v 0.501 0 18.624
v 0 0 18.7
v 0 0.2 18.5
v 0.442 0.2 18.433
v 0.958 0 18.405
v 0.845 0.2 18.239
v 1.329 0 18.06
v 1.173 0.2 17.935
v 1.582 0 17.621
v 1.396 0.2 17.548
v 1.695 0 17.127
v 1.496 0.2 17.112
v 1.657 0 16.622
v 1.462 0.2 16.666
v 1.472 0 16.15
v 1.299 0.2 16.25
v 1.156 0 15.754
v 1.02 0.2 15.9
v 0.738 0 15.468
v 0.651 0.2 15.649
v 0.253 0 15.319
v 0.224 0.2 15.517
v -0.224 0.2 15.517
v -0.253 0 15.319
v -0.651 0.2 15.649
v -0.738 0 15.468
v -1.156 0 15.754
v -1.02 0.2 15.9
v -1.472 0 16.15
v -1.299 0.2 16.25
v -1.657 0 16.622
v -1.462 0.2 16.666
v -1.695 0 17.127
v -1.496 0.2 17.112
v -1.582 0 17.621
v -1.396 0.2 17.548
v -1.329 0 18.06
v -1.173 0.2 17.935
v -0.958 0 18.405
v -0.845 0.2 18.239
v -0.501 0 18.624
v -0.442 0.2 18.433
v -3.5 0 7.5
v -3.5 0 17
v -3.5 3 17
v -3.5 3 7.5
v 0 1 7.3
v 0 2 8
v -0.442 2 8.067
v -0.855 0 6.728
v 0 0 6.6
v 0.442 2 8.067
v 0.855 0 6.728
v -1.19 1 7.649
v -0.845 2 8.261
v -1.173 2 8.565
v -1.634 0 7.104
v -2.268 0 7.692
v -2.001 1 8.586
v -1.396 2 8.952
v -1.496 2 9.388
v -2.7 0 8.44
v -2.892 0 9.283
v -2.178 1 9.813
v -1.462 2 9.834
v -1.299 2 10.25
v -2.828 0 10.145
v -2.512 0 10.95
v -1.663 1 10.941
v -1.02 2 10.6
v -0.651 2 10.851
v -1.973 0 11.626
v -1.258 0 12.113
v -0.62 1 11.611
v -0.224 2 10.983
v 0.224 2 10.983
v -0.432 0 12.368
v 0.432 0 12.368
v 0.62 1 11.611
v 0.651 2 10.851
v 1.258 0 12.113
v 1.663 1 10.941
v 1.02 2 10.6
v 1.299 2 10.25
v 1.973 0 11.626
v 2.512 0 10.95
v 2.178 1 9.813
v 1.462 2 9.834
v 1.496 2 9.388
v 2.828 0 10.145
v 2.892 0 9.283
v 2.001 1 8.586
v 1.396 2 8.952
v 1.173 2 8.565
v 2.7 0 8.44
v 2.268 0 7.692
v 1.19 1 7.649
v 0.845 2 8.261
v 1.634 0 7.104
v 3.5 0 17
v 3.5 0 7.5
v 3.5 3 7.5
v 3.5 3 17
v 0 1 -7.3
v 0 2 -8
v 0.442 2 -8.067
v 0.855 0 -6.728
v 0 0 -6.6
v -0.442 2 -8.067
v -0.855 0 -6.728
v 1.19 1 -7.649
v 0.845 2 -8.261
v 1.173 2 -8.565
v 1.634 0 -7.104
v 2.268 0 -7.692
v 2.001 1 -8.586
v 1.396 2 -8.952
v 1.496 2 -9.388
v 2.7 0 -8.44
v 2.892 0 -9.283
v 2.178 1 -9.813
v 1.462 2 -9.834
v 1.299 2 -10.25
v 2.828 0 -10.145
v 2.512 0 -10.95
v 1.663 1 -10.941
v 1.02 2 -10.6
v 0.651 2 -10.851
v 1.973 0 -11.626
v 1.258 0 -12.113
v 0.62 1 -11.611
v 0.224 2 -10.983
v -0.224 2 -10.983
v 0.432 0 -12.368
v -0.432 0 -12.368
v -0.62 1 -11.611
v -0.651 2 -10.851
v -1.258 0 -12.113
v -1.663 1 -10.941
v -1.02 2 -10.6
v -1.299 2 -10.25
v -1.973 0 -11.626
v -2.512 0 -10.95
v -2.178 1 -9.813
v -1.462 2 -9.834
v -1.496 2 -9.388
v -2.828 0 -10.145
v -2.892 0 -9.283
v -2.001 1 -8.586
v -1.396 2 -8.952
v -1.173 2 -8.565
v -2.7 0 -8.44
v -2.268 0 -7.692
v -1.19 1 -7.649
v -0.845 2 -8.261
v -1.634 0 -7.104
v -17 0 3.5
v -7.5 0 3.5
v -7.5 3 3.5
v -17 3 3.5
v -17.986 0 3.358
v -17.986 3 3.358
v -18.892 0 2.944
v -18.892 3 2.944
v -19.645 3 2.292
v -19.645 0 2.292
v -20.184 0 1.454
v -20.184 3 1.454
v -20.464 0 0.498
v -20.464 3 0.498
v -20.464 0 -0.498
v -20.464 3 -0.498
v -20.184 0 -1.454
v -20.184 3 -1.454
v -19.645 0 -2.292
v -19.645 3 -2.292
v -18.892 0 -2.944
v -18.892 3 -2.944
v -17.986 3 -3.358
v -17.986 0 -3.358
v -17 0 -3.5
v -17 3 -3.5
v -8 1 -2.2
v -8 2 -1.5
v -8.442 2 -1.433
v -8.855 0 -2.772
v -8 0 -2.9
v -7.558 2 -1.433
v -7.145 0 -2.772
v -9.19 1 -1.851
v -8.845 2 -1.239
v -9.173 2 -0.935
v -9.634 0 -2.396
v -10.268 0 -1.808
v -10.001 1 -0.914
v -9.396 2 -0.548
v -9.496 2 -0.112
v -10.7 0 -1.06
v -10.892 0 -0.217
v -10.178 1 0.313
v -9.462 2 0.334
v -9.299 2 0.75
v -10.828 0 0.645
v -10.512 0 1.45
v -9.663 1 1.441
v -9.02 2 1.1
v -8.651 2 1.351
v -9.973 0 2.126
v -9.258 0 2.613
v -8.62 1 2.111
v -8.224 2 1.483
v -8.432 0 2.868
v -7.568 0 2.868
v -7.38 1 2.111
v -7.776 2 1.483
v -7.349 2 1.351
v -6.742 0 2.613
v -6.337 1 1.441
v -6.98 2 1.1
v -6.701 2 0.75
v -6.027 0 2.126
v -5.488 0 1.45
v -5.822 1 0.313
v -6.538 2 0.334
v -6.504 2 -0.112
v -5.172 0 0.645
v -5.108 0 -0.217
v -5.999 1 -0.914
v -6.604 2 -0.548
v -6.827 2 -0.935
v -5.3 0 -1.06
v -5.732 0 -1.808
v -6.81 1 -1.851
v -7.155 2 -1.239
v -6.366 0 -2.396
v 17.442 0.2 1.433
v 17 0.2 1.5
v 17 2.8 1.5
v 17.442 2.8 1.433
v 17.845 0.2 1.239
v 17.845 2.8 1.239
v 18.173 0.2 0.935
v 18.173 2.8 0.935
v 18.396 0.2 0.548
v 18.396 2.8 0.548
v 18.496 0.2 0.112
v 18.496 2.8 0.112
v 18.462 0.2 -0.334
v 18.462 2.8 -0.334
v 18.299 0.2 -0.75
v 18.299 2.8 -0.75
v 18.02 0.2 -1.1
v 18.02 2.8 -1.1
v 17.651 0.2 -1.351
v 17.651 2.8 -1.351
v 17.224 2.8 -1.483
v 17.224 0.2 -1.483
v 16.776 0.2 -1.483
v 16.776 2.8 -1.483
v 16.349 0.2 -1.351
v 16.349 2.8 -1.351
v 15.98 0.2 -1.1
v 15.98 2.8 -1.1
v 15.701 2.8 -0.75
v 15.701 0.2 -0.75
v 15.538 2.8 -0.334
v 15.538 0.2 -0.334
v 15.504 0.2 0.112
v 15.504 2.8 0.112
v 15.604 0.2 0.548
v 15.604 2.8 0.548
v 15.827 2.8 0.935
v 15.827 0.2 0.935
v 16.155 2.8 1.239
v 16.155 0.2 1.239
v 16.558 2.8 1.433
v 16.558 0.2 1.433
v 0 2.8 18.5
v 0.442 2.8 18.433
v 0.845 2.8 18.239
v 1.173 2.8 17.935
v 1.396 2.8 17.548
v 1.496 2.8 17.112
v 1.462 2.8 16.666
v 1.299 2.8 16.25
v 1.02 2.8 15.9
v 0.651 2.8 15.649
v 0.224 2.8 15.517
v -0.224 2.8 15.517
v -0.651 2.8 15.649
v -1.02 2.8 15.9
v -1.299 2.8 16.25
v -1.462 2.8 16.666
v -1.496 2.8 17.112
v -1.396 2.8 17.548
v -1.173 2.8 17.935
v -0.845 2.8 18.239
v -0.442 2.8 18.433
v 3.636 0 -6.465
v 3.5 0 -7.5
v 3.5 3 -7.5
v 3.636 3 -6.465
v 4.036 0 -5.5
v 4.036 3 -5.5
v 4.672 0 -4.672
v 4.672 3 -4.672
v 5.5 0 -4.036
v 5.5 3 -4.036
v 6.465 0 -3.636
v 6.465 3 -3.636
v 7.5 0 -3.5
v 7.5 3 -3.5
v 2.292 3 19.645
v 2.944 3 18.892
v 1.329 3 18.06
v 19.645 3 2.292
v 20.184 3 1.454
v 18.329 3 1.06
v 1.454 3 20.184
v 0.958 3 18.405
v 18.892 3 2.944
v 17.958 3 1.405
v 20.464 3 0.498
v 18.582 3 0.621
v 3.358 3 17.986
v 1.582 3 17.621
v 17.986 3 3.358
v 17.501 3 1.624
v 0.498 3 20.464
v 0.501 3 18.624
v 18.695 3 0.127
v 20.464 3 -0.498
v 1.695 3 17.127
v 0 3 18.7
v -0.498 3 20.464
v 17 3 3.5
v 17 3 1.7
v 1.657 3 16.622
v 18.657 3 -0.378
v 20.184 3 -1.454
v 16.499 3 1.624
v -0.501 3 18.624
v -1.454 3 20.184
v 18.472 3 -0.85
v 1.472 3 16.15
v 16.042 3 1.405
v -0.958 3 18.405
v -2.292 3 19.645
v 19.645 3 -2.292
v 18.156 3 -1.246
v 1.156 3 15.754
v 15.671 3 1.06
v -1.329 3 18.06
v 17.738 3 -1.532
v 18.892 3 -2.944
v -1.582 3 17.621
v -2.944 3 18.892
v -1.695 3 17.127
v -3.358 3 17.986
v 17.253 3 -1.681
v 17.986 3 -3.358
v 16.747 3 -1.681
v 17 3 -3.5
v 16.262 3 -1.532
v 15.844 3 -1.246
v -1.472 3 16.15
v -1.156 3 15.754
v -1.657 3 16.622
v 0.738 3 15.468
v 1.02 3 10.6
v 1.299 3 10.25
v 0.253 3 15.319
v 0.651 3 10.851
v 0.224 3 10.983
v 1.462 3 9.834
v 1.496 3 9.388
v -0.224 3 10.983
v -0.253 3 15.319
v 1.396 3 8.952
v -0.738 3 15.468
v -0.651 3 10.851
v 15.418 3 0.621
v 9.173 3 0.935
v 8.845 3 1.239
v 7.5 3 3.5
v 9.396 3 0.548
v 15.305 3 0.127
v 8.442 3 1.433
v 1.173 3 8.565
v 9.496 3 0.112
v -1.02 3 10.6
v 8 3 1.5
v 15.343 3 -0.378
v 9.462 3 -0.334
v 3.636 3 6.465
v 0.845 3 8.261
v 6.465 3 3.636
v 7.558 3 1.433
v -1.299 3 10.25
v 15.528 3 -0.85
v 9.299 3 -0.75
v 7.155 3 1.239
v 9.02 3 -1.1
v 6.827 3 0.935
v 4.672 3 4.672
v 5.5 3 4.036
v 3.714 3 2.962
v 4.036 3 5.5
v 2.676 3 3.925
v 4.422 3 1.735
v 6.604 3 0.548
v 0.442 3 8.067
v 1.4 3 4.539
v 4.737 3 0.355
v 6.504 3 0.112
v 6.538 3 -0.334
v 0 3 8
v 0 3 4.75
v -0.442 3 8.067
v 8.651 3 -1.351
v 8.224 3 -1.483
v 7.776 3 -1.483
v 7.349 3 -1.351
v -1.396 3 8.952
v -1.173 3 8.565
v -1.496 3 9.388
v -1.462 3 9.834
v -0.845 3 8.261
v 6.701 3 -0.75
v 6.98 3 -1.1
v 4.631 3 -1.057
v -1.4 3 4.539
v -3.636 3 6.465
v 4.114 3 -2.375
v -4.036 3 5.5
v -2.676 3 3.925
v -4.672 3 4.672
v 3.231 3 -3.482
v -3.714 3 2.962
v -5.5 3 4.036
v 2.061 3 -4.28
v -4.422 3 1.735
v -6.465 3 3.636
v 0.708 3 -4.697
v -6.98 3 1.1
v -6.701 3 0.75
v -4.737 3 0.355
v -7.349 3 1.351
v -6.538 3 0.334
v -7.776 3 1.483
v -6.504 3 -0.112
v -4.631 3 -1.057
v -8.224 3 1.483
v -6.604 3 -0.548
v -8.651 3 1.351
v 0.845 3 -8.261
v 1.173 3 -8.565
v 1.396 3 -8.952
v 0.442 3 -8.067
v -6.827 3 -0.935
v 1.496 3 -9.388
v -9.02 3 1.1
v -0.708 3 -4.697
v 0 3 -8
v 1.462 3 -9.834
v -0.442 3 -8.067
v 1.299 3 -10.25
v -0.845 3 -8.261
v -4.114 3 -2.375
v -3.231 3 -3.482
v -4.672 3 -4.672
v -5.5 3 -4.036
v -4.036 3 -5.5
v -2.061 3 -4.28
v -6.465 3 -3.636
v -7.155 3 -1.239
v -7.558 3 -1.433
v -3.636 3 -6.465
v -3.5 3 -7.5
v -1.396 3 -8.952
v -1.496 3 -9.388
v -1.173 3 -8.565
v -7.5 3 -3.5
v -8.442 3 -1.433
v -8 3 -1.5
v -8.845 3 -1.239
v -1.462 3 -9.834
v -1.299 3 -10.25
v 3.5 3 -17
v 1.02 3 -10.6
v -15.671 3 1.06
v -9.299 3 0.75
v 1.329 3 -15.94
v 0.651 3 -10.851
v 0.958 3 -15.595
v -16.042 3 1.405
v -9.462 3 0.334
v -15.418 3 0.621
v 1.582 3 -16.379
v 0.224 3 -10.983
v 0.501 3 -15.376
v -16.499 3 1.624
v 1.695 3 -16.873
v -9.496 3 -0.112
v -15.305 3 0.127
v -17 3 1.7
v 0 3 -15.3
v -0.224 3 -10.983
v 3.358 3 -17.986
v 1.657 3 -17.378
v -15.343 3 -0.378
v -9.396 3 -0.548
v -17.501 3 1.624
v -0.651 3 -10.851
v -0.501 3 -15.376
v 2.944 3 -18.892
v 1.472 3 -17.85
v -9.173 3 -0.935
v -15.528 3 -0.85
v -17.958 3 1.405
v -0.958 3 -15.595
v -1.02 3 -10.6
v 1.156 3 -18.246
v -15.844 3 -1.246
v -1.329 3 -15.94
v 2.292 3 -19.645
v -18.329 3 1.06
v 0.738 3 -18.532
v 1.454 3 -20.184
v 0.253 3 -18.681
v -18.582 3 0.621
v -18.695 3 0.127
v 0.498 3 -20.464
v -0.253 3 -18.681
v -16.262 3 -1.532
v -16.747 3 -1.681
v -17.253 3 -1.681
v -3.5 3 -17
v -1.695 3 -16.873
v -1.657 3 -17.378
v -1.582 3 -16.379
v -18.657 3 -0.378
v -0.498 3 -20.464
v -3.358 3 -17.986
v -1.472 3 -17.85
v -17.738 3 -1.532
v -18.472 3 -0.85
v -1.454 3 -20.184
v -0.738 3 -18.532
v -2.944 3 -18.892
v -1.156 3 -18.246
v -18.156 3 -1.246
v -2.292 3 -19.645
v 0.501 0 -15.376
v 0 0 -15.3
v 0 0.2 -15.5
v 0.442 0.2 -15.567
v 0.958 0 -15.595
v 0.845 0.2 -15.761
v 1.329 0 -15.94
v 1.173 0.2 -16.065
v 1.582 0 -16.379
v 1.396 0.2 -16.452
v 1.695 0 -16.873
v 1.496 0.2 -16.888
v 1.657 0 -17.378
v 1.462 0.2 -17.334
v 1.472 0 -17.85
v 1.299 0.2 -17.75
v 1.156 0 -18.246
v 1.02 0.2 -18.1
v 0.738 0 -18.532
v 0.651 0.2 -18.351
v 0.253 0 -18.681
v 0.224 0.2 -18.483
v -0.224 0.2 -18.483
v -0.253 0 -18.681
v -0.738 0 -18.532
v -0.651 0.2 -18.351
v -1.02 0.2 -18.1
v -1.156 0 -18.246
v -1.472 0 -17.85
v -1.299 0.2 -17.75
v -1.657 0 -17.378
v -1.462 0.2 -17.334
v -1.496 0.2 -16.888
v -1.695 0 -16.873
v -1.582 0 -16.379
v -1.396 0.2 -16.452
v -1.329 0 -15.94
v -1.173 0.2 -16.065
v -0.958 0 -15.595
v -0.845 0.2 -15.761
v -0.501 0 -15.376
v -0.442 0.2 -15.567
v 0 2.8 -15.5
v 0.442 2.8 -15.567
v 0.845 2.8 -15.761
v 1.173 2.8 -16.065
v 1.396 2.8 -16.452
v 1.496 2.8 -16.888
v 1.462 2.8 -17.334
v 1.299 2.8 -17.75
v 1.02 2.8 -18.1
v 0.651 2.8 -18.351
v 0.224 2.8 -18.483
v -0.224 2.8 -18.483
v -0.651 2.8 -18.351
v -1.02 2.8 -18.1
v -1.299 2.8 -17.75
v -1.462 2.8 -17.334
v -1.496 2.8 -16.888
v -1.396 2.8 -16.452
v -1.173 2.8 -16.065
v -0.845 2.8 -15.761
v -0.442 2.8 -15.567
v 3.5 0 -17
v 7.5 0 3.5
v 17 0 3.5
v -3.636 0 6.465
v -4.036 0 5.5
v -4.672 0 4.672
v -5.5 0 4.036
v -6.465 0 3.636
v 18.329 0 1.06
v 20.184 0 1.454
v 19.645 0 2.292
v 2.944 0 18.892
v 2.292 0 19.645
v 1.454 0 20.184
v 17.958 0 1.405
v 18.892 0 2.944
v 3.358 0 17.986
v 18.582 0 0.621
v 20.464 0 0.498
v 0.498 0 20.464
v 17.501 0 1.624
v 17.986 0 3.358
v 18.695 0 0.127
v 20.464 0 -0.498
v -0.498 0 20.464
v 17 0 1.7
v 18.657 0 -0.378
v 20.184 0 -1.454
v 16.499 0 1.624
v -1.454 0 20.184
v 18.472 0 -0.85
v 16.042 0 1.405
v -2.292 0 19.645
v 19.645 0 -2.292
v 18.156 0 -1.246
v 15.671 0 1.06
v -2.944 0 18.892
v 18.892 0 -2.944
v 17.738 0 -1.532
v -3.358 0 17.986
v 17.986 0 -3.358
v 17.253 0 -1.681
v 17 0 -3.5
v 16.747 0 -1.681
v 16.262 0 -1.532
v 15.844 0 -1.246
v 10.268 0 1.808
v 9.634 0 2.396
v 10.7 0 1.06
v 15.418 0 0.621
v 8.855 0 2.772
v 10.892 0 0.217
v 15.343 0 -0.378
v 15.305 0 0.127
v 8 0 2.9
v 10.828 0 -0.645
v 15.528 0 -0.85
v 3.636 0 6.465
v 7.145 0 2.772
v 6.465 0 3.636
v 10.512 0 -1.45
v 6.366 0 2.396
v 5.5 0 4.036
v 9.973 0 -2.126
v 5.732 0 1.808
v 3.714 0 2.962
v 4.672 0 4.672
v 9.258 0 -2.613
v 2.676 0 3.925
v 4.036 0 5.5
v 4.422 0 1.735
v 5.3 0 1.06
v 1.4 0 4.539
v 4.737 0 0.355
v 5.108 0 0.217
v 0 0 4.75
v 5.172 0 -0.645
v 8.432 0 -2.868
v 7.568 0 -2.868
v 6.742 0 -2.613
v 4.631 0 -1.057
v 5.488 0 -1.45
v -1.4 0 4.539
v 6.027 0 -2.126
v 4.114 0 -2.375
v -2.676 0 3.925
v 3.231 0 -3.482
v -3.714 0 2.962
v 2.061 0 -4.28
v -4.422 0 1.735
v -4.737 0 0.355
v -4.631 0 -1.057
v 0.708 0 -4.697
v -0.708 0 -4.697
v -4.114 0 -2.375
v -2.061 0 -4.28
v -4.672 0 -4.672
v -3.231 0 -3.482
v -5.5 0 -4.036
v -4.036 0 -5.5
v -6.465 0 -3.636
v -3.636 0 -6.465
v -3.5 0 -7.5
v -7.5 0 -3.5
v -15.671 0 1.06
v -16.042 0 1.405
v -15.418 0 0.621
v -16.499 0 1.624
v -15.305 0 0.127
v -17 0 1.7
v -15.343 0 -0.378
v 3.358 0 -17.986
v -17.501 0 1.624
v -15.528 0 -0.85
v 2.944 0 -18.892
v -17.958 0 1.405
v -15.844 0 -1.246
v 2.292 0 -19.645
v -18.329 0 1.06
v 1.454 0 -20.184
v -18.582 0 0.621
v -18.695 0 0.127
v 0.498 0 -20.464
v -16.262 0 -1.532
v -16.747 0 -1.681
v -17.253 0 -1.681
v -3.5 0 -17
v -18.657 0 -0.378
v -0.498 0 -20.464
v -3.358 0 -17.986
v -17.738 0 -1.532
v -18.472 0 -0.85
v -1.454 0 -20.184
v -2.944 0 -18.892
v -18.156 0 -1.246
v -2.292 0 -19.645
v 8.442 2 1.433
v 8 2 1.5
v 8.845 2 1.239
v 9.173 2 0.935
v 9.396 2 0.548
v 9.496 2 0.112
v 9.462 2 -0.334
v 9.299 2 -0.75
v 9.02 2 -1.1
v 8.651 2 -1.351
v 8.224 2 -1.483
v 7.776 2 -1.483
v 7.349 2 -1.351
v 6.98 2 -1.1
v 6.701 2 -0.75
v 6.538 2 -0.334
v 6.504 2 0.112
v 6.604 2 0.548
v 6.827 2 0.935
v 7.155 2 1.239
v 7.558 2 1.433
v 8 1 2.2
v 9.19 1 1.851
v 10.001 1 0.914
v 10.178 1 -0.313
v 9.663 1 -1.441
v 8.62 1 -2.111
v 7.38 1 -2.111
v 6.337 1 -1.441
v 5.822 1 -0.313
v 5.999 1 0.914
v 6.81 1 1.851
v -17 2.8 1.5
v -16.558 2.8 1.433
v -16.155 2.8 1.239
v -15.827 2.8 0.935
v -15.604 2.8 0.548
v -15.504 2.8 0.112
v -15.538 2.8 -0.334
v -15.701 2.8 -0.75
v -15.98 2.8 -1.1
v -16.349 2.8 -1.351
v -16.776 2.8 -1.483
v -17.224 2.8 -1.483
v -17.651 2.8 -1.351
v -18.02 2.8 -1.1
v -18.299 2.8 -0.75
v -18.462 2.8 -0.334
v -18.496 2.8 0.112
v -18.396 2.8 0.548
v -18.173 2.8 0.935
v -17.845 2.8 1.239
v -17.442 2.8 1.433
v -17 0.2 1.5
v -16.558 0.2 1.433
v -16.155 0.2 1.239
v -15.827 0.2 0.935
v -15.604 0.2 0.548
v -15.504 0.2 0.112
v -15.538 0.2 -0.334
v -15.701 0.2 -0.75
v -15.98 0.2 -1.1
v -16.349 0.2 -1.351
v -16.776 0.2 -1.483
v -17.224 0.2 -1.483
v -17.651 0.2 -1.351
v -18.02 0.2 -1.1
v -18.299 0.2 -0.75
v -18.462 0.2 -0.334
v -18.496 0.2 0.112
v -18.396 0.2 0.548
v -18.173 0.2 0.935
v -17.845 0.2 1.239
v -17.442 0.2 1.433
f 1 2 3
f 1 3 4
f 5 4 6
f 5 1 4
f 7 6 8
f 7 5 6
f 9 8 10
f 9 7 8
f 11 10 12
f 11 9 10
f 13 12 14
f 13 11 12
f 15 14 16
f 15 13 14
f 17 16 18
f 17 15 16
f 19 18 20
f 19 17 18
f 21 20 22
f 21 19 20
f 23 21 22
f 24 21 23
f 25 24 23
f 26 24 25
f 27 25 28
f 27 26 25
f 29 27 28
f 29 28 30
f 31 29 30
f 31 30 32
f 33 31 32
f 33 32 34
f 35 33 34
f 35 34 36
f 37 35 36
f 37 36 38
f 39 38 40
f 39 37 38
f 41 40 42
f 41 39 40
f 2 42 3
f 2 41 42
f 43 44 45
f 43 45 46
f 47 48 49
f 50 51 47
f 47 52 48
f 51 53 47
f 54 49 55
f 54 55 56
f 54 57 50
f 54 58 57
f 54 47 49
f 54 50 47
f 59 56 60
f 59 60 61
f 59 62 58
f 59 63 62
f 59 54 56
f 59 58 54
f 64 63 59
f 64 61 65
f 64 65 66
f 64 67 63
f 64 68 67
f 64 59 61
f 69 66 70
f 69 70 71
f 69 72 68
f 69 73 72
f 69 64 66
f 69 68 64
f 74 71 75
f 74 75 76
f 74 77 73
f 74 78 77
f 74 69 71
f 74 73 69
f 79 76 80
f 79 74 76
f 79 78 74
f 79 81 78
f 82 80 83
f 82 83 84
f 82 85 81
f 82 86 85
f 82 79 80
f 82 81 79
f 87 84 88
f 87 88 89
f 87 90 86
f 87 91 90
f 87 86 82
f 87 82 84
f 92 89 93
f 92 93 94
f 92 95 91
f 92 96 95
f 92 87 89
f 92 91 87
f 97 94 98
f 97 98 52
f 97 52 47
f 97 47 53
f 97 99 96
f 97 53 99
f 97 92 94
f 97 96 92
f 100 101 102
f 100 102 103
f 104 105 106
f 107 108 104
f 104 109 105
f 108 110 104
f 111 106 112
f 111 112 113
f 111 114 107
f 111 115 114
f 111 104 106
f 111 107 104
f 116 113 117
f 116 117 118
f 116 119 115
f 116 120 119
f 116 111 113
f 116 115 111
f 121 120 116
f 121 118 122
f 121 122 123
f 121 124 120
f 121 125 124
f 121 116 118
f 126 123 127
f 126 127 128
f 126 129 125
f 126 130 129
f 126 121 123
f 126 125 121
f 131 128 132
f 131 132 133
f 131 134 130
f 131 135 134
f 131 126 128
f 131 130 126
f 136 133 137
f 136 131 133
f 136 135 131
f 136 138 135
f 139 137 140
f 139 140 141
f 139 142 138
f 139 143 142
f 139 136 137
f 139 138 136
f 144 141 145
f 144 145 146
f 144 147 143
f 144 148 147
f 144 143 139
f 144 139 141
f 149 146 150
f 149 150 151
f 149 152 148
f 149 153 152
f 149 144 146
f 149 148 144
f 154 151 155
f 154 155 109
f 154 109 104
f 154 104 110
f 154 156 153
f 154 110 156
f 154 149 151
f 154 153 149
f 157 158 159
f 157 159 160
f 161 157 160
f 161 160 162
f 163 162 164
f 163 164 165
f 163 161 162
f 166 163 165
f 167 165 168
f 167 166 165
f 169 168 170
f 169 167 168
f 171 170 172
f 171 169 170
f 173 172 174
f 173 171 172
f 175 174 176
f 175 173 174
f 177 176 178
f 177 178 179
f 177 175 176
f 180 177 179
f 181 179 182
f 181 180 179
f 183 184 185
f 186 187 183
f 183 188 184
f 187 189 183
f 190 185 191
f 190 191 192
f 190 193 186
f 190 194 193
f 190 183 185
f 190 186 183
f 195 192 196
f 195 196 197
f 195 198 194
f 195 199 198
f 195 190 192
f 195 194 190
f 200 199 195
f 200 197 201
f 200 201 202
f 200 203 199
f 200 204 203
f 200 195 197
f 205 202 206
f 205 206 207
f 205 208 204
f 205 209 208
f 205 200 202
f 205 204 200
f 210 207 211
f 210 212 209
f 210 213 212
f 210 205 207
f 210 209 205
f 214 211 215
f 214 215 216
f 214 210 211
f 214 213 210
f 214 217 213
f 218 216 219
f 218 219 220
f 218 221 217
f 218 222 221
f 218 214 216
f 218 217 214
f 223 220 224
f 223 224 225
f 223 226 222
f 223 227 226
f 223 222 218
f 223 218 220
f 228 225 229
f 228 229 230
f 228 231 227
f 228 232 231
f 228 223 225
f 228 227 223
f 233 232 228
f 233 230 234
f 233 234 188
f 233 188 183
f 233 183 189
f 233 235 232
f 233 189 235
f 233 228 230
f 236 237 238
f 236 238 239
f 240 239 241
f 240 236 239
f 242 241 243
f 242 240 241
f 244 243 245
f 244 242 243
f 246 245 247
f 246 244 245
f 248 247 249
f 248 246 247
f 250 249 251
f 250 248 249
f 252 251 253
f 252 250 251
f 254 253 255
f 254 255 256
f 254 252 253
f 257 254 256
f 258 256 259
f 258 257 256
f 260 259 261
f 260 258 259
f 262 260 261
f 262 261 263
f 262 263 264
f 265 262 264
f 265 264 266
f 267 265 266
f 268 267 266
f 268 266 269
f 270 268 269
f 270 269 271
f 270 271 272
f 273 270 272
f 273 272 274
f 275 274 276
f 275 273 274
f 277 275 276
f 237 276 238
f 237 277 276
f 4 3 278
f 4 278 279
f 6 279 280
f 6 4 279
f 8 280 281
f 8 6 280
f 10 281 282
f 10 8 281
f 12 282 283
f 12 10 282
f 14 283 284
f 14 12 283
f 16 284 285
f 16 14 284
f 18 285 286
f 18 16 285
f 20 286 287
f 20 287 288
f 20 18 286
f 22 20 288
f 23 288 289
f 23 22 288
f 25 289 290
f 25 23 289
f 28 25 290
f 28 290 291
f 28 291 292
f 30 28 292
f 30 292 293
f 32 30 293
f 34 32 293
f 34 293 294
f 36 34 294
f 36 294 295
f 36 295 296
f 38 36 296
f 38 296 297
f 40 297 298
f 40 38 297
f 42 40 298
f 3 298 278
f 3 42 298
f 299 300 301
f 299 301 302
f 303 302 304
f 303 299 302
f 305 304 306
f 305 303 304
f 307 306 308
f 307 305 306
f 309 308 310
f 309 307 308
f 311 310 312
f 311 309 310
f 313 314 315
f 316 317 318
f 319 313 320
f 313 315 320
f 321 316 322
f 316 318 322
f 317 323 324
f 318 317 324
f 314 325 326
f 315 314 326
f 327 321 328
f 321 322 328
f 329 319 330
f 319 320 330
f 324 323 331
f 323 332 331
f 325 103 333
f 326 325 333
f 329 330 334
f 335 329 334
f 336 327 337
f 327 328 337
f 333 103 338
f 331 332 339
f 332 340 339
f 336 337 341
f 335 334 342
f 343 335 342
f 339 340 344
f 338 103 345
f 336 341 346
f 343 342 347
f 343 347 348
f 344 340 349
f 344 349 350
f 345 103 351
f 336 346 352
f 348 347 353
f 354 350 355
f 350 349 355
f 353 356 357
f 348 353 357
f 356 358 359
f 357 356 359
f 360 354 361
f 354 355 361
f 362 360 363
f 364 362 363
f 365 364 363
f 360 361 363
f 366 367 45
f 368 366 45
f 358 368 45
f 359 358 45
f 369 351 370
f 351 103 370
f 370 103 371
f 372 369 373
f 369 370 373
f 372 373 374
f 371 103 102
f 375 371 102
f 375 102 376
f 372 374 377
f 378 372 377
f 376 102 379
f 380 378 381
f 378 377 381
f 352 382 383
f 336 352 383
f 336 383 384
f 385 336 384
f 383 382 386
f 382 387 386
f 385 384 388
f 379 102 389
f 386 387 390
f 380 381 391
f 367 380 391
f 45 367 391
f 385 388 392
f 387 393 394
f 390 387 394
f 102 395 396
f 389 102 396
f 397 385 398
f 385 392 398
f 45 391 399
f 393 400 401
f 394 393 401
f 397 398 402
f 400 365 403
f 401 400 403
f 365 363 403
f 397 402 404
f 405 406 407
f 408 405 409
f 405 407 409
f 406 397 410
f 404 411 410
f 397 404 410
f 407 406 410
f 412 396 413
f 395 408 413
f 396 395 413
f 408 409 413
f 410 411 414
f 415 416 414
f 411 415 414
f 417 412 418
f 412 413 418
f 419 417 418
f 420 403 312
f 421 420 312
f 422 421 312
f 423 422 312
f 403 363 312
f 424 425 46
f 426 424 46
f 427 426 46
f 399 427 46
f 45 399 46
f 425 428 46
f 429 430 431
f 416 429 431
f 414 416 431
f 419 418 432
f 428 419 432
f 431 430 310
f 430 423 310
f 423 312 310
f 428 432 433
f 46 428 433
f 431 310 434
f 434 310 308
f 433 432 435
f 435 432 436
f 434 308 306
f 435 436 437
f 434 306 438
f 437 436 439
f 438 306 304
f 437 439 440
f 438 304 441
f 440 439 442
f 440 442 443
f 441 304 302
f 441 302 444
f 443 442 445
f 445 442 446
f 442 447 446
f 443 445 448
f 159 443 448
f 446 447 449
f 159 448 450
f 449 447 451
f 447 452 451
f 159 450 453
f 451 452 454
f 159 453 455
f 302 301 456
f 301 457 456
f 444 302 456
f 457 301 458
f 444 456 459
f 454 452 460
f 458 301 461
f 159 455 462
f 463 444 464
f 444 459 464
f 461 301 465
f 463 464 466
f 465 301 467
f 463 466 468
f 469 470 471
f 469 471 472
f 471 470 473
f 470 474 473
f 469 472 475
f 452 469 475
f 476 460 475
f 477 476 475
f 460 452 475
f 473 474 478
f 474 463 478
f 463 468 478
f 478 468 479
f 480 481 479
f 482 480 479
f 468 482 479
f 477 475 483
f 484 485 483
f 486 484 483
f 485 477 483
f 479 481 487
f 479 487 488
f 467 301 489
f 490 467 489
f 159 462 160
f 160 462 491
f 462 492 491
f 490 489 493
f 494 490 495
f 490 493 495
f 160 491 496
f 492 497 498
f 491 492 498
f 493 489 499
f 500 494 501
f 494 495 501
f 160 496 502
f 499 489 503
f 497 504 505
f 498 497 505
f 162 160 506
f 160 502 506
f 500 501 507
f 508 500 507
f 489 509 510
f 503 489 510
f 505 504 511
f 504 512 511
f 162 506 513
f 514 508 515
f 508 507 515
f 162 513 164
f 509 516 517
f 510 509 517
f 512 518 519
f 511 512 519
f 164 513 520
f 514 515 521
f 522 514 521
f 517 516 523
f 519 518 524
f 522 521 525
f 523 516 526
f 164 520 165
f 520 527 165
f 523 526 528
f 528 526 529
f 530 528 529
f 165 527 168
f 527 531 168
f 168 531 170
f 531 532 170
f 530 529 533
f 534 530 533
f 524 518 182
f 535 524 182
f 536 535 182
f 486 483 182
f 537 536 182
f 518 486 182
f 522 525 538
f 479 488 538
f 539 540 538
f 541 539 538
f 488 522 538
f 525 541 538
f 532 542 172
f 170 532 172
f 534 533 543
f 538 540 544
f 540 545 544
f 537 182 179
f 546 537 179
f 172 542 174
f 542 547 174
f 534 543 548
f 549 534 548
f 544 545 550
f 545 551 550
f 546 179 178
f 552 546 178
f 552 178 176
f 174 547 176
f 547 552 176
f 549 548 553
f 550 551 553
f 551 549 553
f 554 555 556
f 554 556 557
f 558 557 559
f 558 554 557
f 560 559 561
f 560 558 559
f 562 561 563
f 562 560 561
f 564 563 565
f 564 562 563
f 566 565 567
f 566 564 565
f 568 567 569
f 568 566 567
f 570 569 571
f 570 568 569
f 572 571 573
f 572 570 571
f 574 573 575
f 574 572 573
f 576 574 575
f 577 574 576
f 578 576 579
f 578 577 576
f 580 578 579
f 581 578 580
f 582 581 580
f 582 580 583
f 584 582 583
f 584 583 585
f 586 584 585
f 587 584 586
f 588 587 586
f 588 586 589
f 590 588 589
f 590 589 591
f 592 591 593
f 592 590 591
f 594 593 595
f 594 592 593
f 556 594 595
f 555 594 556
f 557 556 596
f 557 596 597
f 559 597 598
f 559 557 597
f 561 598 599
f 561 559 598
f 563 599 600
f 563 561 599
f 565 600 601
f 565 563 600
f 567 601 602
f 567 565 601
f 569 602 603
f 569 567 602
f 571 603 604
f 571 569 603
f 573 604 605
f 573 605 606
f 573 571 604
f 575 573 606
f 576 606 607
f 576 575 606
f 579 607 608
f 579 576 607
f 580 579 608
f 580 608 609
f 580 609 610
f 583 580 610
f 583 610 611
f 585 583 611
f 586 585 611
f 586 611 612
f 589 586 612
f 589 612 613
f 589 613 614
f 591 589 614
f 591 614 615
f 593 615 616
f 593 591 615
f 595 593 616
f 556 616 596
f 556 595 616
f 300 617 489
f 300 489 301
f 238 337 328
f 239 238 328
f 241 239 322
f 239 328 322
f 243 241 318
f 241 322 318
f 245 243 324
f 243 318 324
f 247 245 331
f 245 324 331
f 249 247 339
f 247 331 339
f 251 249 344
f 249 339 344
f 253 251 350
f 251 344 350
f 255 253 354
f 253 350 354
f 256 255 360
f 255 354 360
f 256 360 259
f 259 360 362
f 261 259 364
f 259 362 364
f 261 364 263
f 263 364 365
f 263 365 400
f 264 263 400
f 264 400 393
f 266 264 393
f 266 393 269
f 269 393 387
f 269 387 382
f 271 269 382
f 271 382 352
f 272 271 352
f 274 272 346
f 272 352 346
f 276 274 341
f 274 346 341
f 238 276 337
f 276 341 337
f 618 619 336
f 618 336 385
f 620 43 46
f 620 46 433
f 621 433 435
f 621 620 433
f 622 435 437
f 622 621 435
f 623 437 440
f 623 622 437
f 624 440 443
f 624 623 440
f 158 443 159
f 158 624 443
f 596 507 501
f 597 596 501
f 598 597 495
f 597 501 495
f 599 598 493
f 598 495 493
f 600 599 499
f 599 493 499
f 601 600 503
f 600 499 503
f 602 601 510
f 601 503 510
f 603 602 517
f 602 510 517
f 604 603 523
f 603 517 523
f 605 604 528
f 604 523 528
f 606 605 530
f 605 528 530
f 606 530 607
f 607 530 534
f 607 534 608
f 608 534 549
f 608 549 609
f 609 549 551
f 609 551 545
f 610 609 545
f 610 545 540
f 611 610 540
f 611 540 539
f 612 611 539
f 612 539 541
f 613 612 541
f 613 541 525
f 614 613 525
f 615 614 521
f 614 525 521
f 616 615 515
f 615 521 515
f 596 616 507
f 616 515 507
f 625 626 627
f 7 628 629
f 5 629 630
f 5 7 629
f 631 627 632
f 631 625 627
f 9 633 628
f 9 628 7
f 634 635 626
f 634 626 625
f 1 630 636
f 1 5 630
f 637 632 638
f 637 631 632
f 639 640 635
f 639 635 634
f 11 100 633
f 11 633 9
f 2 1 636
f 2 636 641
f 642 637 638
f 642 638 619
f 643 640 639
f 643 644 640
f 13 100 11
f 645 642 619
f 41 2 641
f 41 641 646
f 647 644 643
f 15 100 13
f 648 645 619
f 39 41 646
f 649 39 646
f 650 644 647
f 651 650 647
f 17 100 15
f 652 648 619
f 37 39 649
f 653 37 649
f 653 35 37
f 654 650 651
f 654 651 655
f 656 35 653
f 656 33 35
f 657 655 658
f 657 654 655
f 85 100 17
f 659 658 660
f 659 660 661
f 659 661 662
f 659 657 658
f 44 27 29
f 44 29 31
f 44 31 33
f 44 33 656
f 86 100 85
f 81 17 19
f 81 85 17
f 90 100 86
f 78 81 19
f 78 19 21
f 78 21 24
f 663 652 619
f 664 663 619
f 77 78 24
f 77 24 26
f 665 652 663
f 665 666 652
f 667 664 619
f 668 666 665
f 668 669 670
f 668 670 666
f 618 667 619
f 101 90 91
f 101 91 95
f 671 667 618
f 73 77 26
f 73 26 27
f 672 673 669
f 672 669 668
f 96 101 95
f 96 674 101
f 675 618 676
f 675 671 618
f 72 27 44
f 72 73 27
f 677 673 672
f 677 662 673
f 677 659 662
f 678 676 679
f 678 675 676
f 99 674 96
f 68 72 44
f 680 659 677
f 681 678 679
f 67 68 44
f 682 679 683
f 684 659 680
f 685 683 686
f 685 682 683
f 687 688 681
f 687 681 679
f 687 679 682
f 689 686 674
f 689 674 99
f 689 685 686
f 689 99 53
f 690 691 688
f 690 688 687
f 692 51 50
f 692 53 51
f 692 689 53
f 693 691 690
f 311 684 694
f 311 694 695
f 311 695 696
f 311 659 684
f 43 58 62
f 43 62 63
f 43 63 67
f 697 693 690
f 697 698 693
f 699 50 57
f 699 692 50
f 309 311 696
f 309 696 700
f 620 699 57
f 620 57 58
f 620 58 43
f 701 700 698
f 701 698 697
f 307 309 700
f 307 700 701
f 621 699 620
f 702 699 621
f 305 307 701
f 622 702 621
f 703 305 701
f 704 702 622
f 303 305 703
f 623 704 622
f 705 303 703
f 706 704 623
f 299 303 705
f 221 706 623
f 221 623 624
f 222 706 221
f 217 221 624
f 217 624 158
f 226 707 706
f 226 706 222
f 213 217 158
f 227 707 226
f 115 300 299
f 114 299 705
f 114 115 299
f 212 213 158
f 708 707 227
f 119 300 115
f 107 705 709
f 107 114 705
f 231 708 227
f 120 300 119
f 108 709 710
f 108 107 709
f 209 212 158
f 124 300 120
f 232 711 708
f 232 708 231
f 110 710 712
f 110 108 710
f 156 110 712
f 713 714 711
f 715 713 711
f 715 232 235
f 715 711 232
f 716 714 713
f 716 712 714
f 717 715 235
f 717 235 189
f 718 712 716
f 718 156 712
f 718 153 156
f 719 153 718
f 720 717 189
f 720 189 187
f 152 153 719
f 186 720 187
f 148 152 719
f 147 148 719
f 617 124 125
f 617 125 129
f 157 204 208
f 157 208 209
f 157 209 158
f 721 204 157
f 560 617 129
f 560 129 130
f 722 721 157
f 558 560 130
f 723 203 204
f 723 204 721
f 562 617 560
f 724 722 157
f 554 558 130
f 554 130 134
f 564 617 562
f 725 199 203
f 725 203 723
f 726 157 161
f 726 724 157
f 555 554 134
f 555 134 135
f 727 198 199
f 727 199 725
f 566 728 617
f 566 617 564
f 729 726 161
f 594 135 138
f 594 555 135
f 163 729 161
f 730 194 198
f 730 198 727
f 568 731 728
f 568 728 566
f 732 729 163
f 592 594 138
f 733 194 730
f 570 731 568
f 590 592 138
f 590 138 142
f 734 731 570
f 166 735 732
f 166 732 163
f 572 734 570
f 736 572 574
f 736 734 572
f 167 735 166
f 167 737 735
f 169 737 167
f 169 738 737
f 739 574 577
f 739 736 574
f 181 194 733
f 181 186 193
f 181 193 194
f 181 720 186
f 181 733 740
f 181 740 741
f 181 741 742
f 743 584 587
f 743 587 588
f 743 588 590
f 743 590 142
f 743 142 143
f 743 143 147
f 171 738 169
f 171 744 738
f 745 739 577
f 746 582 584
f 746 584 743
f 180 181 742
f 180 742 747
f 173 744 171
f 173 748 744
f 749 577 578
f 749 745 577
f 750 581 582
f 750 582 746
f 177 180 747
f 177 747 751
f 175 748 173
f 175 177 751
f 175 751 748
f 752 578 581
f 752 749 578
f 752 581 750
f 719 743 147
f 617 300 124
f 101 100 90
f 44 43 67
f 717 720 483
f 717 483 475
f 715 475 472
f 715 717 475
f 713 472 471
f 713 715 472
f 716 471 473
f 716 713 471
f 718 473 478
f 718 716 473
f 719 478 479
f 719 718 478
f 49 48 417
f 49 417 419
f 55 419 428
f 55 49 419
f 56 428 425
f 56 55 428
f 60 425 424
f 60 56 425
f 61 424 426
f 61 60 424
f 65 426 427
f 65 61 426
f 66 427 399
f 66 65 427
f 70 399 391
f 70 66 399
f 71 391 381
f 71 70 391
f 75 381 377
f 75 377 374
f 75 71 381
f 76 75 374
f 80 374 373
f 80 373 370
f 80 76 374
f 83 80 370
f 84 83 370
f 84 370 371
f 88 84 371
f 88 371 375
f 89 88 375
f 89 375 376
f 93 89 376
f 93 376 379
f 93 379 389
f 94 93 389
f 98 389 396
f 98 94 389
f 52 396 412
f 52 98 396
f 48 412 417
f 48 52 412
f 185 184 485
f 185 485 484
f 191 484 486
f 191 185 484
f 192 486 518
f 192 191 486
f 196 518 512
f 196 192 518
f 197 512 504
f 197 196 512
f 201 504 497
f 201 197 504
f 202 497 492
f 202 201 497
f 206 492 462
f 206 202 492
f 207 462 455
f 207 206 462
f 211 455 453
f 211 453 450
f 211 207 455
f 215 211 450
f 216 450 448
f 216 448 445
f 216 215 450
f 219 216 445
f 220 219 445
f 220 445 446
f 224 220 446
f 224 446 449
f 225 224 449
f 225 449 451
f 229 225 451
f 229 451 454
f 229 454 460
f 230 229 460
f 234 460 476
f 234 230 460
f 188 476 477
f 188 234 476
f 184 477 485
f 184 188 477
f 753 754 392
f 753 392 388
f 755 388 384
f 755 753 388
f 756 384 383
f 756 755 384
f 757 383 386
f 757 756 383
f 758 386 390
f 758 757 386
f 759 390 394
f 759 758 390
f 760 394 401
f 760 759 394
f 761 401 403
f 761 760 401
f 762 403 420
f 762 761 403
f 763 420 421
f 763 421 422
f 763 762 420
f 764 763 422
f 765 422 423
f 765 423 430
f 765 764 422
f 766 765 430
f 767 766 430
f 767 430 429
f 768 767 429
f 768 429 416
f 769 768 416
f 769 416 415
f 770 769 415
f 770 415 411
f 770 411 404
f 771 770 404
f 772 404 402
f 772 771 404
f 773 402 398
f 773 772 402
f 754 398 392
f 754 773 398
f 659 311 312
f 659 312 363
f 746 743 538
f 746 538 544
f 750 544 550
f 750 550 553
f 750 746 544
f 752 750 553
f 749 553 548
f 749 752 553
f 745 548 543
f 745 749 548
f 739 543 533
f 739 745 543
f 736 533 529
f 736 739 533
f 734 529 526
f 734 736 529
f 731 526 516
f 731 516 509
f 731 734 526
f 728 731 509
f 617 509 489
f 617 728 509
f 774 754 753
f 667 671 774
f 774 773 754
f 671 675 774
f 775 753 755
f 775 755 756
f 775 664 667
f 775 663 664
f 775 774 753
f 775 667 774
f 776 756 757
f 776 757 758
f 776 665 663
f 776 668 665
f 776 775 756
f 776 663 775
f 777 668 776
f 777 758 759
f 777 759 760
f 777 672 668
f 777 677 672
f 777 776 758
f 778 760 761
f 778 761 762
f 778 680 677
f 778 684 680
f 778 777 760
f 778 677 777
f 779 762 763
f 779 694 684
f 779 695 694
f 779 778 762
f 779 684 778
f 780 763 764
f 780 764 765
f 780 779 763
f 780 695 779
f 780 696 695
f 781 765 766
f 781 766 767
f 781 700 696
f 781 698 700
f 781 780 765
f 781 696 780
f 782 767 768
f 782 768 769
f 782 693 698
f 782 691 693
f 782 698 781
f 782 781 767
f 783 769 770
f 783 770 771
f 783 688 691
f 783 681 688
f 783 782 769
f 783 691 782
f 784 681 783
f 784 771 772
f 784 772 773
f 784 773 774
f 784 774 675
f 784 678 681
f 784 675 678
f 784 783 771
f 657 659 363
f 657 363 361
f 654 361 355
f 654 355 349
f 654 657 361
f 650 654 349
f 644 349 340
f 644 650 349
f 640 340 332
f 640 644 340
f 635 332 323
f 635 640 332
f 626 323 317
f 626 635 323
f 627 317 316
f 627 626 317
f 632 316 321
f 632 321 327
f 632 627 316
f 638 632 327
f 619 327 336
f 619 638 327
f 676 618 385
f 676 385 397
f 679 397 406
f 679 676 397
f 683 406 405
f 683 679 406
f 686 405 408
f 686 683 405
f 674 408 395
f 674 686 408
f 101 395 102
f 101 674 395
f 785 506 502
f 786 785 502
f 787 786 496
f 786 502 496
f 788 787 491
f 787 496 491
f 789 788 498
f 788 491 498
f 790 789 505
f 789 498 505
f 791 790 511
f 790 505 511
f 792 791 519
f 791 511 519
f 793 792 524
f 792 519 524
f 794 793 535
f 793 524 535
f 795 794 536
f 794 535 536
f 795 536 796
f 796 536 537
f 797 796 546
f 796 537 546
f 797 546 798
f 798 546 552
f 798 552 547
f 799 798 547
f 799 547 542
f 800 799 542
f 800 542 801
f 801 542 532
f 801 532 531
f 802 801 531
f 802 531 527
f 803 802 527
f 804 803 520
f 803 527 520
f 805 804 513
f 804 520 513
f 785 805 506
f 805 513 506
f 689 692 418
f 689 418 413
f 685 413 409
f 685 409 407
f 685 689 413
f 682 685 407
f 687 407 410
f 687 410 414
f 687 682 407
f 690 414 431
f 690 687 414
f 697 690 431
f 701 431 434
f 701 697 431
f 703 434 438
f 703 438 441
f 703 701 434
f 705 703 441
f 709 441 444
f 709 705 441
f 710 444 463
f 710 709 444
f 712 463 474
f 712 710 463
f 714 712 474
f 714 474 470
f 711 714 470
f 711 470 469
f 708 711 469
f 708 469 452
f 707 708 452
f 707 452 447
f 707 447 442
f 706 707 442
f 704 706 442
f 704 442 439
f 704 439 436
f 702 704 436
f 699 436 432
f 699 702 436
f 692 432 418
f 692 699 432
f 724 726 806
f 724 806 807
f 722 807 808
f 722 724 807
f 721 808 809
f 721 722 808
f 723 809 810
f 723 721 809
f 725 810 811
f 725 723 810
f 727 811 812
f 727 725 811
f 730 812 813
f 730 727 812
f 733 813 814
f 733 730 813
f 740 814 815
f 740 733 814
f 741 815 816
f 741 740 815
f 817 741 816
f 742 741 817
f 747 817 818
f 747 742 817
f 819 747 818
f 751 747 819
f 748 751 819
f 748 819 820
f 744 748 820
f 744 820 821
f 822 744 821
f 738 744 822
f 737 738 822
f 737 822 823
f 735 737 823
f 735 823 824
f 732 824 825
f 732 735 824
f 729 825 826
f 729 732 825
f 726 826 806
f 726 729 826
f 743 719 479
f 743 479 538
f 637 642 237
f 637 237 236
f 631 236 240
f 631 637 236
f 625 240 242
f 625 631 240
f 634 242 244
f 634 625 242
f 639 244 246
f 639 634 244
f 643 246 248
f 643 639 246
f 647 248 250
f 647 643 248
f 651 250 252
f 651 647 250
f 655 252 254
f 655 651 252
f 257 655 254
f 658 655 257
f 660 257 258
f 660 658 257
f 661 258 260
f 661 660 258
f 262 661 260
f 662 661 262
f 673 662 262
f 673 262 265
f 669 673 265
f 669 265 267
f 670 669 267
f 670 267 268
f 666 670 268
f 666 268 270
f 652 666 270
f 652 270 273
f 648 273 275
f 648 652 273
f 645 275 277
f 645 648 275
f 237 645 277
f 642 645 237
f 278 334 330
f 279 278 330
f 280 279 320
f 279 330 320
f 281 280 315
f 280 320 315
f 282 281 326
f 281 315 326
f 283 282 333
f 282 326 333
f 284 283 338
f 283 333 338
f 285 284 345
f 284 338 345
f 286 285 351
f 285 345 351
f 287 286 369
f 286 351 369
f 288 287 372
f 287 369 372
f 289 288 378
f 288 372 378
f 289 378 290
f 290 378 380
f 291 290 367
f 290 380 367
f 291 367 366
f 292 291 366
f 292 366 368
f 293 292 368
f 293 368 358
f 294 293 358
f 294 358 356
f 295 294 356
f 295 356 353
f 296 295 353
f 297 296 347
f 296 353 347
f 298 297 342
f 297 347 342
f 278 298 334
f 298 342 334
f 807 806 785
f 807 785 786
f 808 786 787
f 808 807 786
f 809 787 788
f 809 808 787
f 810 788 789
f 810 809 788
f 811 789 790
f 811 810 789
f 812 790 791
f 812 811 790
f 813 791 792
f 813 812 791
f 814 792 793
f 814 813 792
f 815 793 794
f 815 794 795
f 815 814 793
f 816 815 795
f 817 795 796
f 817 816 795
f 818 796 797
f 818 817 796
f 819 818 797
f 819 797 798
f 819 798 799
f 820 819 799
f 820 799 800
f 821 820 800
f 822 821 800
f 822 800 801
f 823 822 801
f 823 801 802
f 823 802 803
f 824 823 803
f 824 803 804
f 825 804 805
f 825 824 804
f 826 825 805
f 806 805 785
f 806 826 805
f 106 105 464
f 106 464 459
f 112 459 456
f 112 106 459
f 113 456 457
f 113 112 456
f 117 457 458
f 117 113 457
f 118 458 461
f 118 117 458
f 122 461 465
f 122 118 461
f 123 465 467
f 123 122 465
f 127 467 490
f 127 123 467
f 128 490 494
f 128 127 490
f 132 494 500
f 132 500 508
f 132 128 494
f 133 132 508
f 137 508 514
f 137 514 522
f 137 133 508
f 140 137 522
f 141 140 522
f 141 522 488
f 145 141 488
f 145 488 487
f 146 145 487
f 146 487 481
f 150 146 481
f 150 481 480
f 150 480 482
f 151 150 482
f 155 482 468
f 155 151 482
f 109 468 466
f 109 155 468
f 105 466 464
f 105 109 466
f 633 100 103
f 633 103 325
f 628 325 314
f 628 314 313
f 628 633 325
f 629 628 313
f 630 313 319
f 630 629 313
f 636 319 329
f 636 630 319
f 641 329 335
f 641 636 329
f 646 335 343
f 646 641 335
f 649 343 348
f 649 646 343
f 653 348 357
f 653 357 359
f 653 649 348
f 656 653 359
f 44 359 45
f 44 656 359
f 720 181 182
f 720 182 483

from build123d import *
from OCP.BRepFilletAPI import BRepFilletAPI_MakeChamfer

# Parameters (mm, degrees)
SKETCH1_R           = 1.5
SKETCH1_R_2         = 4.75
BOSS_EXTRUDE1_DEPTH = 3
CHAMFER1_SIZE       = 0.2
CHAMFER2_SIZE       = 2
CHAMFER2_SIZE2      = 1.400415076


with BuildPart() as part:
    # Sketch1 → Boss-Extrude1 (new body)
    with BuildSketch(Plane(origin=(0, 0, 0), x_dir=(1, 0, 0), z_dir=(0, 1, 0))):
        with BuildLine():
            Line((-3.5, 7.5), (-3.5, 17))
            ThreePointArc((-3.5, 17), (0, 20.5), (3.5, 17))
            Line((3.5, 17), (3.5, 7.5))
            ThreePointArc((3.5, 7.5), (4.671572875, 4.671572875), (7.5, 3.5))
            Line((7.5, 3.5), (17, 3.5))
            ThreePointArc((17, 3.5), (20.5, 0), (17, -3.5))
            Line((17, -3.5), (7.5, -3.5))
            ThreePointArc((7.5, -3.5), (4.671572875, -4.671572875), (3.5, -7.5))
            Line((3.5, -7.5), (3.5, -17))
            ThreePointArc((3.5, -17), (0, -20.5), (-3.5, -17))
            Line((-3.5, -17), (-3.5, -7.5))
            ThreePointArc((-3.5, -7.5), (-4.671572875, -4.671572875), (-7.5, -3.5))
            Line((-7.5, -3.5), (-17, -3.5))
            ThreePointArc((-17, -3.5), (-20.5, 0), (-17, 3.5))
            Line((-17, 3.5), (-7.5, 3.5))
            ThreePointArc((-7.5, 3.5), (-4.671572875, 4.671572875), (-3.5, 7.5))
        make_face()
        with Locations(Location((0, 17, 0), (0, 0, 270))):
            Circle(SKETCH1_R, mode=Mode.SUBTRACT)
        with Locations(Location((0, 0, 0), (0, 0, 270))):
            Circle(SKETCH1_R_2, mode=Mode.SUBTRACT)
        with Locations(Location((17, 0, 0), (0, 0, 270))):
            Circle(SKETCH1_R, mode=Mode.SUBTRACT)
        with Locations(Location((0, -17, 0), (0, 0, 270))):
            Circle(SKETCH1_R, mode=Mode.SUBTRACT)
        with Locations(Location((-17, 0, 0), (0, 0, 270))):
            Circle(SKETCH1_R, mode=Mode.SUBTRACT)
        with Locations(Location((0, 9.5, 0), (0, 0, 270))):
            Circle(SKETCH1_R, mode=Mode.SUBTRACT)
        with Locations(Location((8, 0, 0), (0, 0, 270))):
            Circle(SKETCH1_R, mode=Mode.SUBTRACT)
        with Locations(Location((-8, 0, 0), (0, 0, 90))):
            Circle(SKETCH1_R, mode=Mode.SUBTRACT)
        with Locations(Location((0, -9.5, 0), (0, 0, 90))):
            Circle(SKETCH1_R, mode=Mode.SUBTRACT)
    extrude(amount=BOSS_EXTRUDE1_DEPTH)

    # Chamfer1
    chamfer1_edges = [part.edges().sort_by_distance(p)[0] for p in [
        (0, 0, -18.5),
        (0, 3, -18.5),
        (17, 0, -1.5),
        (17, 3, -1.5),
        (0, 0, 15.5),
        (0, 3, 15.5),
        (-17, 0, -1.5),
        (-17, 3, -1.5),
    ]]
    chamfer(chamfer1_edges, length=CHAMFER1_SIZE)

    # Chamfer2: one chamfer whose edges measure the first distance from different faces: ONE call of the kernel's chamfer builder (chamfer() names one face for all edges)
    chamfer2_edges_1 = [part.edges().sort_by_distance(p)[0] for p in [
        (0, 0, -11),
    ]]
    chamfer2_side_1 = [part.faces().sort_by_distance(p)[0] for p in [
        (0, 1.5, -11),
    ]]
    chamfer2_edges_2 = [part.edges().sort_by_distance(p)[0] for p in [
        (8, 0, -1.5),
    ]]
    chamfer2_side_2 = [part.faces().sort_by_distance(p)[0] for p in [
        (8, 1.5, -1.5),
    ]]
    chamfer2_edges_3 = [part.edges().sort_by_distance(p)[0] for p in [
        (-8, 0, 1.5),
    ]]
    chamfer2_side_3 = [part.faces().sort_by_distance(p)[0] for p in [
        (-8, 1.5, 1.5),
    ]]
    chamfer2_edges_4 = [part.edges().sort_by_distance(p)[0] for p in [
        (0, 0, 11),
    ]]
    chamfer2_side_4 = [part.faces().sort_by_distance(p)[0] for p in [
        (0, 1.5, 11),
    ]]
    chamfer2 = BRepFilletAPI_MakeChamfer(part.part.solid().wrapped)
    for e in chamfer2_edges_1:
        chamfer2.Add(CHAMFER2_SIZE, CHAMFER2_SIZE2, e.wrapped, chamfer2_side_1[0].wrapped)  # the first distance lies on this face
    for e in chamfer2_edges_2:
        chamfer2.Add(CHAMFER2_SIZE, CHAMFER2_SIZE2, e.wrapped, chamfer2_side_2[0].wrapped)  # the first distance lies on this face
    for e in chamfer2_edges_3:
        chamfer2.Add(CHAMFER2_SIZE, CHAMFER2_SIZE2, e.wrapped, chamfer2_side_3[0].wrapped)  # the first distance lies on this face
    for e in chamfer2_edges_4:
        chamfer2.Add(CHAMFER2_SIZE, CHAMFER2_SIZE2, e.wrapped, chamfer2_side_4[0].wrapped)  # the first distance lies on this face
    add(Compound.cast(chamfer2.Shape()), mode=Mode.REPLACE)


solid = part.part
